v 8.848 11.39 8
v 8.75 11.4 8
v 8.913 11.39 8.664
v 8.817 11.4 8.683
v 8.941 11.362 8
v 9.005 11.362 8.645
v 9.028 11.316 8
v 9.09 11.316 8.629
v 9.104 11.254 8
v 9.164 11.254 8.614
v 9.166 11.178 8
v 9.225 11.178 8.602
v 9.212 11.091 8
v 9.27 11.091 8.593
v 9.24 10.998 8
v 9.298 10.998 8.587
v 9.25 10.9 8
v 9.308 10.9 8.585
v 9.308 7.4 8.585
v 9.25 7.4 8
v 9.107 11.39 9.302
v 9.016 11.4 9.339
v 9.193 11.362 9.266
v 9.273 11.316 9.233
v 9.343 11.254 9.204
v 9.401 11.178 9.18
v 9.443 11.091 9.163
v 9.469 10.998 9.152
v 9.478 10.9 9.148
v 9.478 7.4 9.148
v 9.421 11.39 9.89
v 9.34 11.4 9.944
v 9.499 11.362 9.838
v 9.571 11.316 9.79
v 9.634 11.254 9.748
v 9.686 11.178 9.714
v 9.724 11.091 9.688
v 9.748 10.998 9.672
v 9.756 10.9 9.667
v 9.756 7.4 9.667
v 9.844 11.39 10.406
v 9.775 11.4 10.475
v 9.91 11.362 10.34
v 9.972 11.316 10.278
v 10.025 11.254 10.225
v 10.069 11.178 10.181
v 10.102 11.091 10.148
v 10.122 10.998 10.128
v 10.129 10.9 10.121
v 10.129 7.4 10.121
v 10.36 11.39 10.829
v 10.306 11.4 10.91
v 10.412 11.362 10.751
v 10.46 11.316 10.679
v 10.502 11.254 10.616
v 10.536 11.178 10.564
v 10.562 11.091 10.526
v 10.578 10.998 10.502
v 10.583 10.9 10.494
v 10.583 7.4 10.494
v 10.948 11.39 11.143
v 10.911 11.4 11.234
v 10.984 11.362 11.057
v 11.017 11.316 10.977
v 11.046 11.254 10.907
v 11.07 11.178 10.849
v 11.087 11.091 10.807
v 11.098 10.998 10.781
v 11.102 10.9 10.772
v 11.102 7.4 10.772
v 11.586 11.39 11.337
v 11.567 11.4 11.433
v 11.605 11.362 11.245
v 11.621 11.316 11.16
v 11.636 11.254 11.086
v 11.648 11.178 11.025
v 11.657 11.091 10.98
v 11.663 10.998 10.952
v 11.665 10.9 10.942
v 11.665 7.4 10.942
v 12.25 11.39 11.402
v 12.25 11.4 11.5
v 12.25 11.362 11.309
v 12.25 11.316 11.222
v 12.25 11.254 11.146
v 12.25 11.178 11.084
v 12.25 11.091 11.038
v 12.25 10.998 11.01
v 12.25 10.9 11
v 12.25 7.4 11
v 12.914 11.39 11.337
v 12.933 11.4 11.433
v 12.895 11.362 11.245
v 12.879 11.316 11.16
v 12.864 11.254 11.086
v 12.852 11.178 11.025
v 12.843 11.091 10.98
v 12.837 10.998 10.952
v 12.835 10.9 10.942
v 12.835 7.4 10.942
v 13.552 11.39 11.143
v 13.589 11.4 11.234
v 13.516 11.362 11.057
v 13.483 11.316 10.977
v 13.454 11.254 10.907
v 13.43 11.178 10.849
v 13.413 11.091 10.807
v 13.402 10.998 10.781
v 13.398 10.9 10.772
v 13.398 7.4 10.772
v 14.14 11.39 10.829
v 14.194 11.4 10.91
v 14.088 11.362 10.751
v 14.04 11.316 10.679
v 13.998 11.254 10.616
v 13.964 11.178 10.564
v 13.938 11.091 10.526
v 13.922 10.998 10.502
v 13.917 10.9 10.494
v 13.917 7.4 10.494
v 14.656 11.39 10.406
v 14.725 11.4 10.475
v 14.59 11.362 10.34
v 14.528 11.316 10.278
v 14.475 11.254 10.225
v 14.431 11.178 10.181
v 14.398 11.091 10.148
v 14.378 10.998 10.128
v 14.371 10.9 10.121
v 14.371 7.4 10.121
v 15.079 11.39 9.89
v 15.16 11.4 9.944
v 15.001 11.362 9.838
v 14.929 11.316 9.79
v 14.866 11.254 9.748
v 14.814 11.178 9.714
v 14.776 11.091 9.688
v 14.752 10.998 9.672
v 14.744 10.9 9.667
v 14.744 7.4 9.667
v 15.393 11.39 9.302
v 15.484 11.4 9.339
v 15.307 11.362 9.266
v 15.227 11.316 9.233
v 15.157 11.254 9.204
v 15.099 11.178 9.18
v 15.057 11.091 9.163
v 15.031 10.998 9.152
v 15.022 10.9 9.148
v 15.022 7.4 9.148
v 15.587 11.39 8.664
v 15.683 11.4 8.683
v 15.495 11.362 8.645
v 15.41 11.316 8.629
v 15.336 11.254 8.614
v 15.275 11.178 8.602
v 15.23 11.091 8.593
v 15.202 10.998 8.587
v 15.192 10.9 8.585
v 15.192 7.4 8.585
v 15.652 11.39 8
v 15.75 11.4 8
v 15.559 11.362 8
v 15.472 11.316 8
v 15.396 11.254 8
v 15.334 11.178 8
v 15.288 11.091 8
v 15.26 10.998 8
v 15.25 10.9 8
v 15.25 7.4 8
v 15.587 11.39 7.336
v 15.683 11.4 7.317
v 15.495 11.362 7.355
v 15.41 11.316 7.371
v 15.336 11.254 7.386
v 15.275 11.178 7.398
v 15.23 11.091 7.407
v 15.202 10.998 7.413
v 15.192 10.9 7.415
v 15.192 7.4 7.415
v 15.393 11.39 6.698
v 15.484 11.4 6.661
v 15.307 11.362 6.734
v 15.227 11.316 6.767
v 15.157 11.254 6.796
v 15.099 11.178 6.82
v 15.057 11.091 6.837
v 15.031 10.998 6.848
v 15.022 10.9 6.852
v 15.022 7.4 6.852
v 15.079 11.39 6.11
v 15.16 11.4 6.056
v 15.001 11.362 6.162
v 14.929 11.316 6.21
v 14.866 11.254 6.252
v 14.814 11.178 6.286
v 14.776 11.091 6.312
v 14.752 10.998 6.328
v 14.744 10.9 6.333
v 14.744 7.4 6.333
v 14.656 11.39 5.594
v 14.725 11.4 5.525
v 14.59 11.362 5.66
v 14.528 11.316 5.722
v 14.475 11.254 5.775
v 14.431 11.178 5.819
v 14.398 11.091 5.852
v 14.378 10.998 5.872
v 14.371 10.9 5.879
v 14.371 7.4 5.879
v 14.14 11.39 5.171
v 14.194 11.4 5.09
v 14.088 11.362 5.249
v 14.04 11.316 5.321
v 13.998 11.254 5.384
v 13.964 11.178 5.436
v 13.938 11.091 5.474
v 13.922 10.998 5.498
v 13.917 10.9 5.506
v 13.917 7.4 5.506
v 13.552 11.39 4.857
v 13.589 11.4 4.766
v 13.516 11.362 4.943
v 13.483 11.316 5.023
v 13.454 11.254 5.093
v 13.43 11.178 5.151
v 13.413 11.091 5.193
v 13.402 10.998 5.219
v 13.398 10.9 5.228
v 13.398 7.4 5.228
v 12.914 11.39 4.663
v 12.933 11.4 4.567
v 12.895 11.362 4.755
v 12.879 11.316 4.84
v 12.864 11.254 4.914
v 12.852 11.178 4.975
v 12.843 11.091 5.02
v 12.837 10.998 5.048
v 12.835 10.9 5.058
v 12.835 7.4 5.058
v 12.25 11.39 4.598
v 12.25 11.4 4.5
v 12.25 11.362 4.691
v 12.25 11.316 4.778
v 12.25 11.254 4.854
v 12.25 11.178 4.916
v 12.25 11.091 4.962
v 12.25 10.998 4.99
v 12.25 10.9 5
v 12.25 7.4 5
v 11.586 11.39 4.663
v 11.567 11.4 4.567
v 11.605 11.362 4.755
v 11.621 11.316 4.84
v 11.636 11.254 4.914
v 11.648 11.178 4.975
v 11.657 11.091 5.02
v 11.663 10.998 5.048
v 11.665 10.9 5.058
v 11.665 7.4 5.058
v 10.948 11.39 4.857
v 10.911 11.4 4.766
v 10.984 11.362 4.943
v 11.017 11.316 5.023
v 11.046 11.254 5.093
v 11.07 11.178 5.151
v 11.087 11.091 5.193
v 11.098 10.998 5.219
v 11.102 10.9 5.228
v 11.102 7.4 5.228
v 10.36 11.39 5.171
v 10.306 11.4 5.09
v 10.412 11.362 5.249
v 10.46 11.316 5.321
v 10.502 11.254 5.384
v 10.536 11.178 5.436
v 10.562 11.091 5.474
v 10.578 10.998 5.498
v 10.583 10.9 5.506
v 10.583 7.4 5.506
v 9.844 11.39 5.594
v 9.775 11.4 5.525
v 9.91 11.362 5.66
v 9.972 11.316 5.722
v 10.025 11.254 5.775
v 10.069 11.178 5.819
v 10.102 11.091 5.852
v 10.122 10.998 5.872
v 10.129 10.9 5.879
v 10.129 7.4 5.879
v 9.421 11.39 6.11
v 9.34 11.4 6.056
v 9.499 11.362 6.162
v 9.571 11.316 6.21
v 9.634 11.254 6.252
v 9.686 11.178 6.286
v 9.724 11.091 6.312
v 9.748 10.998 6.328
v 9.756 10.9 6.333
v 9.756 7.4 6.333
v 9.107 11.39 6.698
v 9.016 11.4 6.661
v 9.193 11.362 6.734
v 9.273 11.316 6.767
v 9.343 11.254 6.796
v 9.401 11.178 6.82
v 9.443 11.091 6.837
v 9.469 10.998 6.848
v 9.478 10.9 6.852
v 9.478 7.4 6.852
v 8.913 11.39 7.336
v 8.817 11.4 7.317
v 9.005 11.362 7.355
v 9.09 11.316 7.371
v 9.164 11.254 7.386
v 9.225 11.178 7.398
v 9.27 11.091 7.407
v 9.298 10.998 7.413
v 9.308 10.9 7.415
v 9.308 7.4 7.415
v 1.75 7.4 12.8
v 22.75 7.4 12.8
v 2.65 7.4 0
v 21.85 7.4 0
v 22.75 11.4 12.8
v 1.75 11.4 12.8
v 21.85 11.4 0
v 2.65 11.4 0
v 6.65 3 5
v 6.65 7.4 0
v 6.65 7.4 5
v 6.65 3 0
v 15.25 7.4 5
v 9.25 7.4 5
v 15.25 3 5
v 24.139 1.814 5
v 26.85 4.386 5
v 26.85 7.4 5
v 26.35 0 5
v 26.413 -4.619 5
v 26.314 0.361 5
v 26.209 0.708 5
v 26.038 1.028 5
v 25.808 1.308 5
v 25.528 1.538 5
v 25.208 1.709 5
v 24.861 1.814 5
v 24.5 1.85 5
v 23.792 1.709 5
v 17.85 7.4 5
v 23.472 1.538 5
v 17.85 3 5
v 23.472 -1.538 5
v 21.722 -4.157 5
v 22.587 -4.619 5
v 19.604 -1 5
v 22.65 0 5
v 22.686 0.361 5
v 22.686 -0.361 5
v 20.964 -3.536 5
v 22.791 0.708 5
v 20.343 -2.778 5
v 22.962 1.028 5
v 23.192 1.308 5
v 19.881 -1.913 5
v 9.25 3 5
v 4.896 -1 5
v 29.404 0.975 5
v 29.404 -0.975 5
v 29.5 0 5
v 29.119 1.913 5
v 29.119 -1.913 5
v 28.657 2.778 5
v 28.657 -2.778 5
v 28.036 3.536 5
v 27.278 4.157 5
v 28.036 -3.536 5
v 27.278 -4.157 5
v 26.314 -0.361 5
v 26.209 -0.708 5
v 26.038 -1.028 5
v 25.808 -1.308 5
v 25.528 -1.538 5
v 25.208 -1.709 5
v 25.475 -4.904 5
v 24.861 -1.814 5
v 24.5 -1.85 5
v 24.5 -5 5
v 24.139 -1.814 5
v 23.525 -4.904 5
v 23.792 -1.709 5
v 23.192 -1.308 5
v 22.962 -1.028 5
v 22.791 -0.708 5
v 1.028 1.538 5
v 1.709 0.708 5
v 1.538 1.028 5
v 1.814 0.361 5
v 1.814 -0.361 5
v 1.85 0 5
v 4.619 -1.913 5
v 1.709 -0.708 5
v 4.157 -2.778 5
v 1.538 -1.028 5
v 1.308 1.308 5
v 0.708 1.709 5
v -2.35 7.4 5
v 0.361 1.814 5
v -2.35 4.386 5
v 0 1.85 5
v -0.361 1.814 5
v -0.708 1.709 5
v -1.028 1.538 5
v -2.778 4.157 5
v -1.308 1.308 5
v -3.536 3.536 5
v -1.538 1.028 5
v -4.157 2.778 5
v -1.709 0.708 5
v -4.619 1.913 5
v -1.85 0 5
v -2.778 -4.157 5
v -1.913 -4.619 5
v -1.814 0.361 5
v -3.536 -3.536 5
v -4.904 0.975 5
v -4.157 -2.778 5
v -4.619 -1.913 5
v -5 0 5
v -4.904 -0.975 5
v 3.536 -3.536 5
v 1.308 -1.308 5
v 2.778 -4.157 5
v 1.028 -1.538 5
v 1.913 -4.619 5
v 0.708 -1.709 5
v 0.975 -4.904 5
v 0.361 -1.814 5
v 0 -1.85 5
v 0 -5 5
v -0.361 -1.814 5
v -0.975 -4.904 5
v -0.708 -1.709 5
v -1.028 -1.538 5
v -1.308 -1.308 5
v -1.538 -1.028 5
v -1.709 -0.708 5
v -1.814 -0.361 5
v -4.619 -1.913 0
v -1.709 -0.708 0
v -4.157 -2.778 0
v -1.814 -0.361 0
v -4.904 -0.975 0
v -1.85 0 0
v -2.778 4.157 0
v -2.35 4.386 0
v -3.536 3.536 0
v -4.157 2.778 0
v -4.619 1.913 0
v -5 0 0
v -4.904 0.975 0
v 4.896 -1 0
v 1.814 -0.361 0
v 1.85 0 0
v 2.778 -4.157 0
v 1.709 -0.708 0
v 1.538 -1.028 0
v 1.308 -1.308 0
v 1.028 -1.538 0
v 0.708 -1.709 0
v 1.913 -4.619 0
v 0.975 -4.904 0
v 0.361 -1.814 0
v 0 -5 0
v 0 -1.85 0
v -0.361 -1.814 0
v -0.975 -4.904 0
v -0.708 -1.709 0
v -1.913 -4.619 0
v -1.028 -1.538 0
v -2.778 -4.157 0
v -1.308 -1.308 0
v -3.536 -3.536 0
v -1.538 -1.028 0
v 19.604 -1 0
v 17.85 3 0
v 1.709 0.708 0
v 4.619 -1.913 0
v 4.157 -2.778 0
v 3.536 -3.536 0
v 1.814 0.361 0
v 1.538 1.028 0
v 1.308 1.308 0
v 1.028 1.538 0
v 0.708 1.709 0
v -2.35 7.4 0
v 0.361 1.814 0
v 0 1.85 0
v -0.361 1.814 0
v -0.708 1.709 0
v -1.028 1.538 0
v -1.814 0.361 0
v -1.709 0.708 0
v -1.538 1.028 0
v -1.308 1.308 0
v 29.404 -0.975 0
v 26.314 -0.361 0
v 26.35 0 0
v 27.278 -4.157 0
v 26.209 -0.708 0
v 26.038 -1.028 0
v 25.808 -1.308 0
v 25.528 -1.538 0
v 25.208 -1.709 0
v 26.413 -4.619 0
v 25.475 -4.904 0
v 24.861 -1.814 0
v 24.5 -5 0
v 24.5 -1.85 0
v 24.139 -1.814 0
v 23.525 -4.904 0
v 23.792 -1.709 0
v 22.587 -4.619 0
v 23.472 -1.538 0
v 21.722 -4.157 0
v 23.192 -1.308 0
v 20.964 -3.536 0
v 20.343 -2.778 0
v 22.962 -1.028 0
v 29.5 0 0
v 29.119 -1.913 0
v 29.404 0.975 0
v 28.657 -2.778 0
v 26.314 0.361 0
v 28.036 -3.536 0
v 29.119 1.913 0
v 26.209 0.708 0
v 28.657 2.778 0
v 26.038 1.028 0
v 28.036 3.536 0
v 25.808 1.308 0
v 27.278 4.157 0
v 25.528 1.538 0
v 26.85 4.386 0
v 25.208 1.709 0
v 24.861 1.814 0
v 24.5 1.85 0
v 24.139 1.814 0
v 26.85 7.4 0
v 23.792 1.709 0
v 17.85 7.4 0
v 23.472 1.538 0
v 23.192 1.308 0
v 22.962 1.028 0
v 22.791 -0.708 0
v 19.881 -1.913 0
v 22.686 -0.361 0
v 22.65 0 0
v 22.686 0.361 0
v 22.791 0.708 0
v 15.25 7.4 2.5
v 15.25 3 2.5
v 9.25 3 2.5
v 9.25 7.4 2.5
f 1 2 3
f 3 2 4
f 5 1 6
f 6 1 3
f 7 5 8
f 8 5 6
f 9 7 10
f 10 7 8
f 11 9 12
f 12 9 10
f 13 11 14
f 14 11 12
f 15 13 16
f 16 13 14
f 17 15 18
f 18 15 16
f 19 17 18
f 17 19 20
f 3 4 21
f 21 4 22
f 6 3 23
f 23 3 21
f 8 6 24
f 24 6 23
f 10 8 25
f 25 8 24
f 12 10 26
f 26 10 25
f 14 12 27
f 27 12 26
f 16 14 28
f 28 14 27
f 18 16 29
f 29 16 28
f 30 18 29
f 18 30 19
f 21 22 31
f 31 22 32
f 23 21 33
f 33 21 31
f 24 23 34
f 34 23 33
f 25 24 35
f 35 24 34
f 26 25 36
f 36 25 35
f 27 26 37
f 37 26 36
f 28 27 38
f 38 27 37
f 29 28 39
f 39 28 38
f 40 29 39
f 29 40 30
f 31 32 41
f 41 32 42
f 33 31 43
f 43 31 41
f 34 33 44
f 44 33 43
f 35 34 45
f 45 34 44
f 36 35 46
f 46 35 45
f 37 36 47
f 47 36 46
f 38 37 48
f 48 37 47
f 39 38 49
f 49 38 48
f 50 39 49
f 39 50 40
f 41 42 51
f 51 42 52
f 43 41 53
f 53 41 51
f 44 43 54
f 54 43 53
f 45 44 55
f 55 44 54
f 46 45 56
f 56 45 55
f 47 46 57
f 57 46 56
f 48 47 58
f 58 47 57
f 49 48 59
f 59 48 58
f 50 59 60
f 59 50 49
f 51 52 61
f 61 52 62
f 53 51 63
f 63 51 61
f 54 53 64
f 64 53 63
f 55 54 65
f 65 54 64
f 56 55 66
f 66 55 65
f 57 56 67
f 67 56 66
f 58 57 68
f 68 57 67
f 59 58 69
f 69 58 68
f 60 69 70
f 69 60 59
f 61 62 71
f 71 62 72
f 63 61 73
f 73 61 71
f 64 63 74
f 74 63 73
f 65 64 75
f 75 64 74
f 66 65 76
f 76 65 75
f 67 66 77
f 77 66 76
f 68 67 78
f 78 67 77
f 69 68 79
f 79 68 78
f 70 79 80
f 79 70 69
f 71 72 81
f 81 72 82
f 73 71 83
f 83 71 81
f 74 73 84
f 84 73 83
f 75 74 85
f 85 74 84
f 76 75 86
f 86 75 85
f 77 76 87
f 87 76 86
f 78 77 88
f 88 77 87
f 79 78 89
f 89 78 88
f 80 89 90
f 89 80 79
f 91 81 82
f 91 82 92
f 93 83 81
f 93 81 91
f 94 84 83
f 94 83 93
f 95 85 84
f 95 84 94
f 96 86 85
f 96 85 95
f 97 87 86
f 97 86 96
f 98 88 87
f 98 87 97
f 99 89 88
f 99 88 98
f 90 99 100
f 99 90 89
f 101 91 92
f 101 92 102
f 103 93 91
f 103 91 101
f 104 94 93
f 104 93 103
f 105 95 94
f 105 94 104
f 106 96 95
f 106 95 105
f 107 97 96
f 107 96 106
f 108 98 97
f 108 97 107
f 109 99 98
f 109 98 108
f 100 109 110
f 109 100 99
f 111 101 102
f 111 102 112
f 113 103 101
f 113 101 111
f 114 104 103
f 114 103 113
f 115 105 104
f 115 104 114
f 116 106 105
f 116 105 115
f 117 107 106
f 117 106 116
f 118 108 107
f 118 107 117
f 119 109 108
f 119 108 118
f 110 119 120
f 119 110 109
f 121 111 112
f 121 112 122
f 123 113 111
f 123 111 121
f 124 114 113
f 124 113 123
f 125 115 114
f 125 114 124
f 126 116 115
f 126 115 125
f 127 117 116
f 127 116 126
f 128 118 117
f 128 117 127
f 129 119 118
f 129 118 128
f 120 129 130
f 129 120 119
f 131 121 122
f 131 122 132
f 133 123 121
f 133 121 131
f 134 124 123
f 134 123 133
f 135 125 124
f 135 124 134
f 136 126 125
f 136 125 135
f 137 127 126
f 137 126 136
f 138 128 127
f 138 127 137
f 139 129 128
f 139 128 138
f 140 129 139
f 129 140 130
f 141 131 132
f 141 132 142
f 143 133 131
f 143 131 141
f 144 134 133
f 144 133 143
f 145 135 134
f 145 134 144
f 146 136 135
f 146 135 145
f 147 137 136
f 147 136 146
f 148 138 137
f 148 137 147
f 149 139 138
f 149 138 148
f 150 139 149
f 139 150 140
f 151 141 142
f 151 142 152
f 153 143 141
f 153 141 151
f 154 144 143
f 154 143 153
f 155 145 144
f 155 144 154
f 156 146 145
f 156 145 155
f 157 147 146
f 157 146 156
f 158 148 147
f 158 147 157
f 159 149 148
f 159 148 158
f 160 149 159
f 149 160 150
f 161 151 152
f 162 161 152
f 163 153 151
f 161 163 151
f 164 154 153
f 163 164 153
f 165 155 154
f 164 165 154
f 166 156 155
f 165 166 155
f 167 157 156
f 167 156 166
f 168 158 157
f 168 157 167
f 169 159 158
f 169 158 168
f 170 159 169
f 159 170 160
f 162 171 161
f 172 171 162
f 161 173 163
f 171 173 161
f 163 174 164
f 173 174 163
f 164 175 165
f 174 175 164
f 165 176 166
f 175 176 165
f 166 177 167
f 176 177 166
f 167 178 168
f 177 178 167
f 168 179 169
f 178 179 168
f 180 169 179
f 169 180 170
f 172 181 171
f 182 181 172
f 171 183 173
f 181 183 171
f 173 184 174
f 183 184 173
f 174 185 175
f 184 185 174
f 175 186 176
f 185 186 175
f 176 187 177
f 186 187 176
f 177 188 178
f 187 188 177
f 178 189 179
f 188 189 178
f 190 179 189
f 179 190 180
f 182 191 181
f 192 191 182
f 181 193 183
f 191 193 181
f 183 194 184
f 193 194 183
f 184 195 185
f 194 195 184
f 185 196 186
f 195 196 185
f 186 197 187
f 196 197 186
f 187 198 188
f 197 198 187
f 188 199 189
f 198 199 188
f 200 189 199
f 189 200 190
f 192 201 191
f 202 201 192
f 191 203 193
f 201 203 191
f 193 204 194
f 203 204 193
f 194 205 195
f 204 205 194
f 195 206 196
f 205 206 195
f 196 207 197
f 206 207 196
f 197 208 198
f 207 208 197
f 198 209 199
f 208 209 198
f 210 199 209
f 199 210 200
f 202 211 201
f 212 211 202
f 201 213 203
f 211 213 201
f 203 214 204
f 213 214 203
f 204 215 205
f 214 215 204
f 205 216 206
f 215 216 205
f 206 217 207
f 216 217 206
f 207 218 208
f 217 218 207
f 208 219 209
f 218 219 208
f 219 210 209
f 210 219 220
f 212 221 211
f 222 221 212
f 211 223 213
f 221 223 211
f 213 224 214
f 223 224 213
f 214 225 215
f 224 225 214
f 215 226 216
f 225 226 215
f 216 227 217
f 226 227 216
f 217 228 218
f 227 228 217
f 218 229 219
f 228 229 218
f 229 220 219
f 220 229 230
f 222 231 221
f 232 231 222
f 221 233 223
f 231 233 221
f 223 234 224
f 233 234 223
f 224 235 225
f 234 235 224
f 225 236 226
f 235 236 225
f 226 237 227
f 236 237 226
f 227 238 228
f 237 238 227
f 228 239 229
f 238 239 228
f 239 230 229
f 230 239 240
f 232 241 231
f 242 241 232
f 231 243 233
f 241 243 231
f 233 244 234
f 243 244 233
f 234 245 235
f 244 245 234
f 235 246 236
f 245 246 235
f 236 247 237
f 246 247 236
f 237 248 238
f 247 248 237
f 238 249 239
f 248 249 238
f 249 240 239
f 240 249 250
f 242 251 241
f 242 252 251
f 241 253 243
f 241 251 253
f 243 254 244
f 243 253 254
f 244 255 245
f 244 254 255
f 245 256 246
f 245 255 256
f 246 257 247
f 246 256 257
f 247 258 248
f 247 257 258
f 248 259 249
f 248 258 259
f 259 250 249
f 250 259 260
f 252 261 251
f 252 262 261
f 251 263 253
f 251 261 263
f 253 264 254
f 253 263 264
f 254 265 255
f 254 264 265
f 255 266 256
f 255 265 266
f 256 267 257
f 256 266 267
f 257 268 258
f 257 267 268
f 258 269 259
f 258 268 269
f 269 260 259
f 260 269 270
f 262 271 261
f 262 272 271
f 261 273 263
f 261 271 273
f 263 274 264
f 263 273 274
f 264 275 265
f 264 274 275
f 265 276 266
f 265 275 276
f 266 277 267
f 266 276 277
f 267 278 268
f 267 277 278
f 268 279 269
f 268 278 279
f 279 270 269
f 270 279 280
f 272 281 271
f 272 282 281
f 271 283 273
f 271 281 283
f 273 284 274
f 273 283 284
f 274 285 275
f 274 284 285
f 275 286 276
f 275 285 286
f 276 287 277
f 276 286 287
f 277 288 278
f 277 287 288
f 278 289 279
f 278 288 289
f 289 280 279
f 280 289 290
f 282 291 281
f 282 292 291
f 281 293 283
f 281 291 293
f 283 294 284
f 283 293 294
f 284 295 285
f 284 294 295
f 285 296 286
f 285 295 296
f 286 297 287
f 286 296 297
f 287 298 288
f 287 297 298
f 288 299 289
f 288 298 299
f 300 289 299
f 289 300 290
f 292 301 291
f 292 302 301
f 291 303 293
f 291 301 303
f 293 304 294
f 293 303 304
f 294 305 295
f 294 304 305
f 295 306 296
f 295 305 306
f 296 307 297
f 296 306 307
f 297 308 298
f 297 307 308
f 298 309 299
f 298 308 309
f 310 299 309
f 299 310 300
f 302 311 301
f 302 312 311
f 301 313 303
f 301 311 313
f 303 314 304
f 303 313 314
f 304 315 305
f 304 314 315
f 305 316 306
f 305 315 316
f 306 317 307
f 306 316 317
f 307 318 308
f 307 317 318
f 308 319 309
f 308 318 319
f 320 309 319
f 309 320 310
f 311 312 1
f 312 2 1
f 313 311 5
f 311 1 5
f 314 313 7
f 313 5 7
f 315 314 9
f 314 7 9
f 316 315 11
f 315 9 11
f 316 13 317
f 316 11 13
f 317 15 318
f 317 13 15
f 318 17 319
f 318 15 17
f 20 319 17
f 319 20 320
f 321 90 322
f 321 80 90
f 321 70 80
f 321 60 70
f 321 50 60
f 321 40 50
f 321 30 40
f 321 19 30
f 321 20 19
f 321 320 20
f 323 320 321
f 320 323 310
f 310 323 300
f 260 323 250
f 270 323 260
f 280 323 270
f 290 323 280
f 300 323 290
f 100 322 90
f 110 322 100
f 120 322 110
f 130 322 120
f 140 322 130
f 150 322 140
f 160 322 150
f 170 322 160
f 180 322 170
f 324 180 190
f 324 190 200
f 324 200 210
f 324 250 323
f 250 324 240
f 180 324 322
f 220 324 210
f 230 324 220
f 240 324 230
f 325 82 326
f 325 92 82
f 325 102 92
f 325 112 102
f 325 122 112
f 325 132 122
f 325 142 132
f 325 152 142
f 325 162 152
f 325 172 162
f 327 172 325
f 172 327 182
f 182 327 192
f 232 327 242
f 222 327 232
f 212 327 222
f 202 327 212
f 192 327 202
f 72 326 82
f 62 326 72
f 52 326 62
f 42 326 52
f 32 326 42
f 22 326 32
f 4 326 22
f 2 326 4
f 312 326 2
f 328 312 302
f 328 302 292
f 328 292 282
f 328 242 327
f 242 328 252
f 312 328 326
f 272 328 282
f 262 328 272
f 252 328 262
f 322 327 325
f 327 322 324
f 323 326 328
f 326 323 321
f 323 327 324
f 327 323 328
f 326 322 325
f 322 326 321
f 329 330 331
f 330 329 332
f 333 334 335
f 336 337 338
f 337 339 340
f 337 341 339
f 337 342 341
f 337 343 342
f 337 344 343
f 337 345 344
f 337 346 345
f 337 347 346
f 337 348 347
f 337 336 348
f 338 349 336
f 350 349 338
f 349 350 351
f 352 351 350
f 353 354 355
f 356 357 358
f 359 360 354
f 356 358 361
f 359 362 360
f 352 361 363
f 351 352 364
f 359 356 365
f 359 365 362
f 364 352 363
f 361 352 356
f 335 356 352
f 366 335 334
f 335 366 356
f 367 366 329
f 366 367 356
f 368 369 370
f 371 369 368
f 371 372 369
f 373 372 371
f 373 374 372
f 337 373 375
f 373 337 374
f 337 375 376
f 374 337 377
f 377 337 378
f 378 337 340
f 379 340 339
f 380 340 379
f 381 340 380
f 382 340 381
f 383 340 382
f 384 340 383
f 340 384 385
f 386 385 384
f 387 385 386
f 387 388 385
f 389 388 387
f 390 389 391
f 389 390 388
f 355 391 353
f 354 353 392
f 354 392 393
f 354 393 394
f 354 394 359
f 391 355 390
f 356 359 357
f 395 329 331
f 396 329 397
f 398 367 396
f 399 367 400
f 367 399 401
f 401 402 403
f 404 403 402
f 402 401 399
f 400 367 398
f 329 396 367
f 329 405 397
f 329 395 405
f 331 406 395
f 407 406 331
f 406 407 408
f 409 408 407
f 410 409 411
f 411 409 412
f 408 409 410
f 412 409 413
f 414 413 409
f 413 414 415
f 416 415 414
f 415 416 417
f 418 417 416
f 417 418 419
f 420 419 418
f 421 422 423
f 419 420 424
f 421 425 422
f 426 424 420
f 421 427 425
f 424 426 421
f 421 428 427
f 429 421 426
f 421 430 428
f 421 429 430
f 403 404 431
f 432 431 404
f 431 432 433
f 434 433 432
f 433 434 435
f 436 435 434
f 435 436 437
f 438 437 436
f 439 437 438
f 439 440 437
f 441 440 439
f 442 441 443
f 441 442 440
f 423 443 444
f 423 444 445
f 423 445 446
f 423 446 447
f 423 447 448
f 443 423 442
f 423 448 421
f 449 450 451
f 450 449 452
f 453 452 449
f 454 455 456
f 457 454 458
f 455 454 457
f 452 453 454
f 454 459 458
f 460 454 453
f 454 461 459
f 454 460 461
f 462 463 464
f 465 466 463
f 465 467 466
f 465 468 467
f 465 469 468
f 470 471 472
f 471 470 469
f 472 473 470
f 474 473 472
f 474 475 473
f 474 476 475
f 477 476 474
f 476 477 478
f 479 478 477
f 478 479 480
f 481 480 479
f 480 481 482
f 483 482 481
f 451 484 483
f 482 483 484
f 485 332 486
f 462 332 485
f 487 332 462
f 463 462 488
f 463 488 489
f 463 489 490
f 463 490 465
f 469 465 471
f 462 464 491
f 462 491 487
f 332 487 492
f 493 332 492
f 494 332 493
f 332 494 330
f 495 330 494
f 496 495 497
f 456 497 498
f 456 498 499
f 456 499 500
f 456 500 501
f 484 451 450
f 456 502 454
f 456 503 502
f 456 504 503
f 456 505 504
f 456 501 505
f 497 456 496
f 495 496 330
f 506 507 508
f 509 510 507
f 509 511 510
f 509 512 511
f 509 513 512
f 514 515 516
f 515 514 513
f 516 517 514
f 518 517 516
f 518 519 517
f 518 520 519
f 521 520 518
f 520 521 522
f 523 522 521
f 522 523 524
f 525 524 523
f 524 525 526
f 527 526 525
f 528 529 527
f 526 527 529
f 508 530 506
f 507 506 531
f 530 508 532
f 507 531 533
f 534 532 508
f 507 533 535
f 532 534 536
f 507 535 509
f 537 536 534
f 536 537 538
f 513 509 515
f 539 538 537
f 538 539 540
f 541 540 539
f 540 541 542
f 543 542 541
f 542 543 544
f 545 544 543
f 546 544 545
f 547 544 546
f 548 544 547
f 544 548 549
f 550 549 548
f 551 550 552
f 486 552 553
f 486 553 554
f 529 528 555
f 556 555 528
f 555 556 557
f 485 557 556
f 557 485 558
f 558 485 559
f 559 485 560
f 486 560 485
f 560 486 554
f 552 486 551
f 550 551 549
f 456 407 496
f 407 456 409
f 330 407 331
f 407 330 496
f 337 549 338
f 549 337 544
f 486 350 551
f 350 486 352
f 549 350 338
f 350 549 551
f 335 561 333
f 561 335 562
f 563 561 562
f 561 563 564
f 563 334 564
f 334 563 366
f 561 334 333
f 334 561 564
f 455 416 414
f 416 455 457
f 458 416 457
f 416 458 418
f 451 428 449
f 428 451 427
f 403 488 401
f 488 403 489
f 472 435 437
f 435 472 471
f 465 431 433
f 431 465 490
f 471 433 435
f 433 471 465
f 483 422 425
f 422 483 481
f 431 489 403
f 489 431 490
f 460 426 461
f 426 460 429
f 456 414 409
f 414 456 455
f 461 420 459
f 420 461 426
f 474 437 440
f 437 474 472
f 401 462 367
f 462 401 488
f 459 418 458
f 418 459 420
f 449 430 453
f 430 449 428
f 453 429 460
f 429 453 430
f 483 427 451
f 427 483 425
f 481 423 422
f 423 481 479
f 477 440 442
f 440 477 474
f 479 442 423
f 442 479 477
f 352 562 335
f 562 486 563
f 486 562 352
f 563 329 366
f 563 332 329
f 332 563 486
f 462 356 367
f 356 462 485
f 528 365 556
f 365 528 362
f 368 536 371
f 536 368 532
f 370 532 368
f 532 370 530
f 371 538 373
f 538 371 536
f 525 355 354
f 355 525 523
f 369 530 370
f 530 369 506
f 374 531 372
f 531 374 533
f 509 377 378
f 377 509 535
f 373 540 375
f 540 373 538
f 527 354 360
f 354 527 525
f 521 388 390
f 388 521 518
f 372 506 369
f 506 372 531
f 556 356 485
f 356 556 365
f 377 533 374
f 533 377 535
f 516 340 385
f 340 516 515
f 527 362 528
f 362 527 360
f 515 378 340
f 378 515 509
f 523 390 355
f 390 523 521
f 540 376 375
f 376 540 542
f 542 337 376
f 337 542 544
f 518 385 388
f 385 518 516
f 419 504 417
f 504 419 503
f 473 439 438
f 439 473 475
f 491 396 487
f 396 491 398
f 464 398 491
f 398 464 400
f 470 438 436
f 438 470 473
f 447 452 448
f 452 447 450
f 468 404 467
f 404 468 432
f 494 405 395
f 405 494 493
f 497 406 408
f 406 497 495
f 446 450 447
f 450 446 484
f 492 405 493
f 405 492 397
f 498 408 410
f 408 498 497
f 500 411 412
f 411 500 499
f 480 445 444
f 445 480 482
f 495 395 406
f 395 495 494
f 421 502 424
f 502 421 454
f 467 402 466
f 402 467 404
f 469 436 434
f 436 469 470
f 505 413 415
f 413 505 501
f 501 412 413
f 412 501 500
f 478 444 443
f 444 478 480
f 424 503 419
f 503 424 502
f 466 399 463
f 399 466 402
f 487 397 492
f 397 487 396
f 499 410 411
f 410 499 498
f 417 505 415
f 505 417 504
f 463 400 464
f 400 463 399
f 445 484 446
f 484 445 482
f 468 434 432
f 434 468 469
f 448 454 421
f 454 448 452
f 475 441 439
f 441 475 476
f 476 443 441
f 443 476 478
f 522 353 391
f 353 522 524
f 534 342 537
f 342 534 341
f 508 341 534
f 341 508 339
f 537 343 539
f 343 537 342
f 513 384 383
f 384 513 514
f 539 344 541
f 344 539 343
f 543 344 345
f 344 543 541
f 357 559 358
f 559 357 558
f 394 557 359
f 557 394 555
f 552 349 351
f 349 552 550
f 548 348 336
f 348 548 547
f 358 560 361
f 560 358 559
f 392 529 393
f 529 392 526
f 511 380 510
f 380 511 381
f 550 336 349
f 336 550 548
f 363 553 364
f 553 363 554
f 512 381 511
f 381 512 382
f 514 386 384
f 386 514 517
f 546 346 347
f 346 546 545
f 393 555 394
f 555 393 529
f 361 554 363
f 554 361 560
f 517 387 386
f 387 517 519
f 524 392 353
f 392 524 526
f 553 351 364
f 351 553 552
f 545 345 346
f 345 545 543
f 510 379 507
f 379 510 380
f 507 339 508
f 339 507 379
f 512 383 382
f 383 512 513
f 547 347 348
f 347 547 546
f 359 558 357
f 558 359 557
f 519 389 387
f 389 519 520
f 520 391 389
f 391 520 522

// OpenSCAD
// Copyright 2019 Marcos Del Sol Vives
// SPDX-License-Identifier: ISC

$fn=32;

// Height of the base piece that clips on the pins
base_height = 5;

// Space between pins
pin_spacing = 24.5;

// Diameter of plastic pins
pin_diameter = 3.7;

// Thickness of bridge connecting both pins
pin_bridge_thickness = 4;

// Diameter of holders that go around the pins
pin_holder_diameter = 10;

wall_thickness = 4;
wall_width_lower = 19.2;
wall_width_upper = 21; // was 21.2
wall_height = 12.8; // was 14

// Distance from pin center to the wall where the hole is
pin_wall_distance = 7.4; // was 7.3

// Wall-bridge connection offset
wall_bridge_offset = 5;

// Wall-bridge connection thickness
wall_bridge_thickness = 9;

// Cable size
cable_width = 6;
cable_height = 6;

// Zip tie thickness, needed to leave space between holder and PCB
zip_thickness = 2.5;

// Cable hole radius
cable_hole_radius = 0.5;

module hole_bevel_profile() {
	let (
			bb_width = cable_height / 2 + cable_hole_radius
	) {

		difference() {
			square([bb_width, cable_hole_radius]);
			translate([bb_width, cable_hole_radius])
				circle(r = cable_hole_radius);
		}
		translate([0, cable_hole_radius]) {
			square([cable_height / 2, wall_thickness - cable_hole_radius]);
		}
	}
}

difference() {
	union() {
		// Build holder for left pin
		cylinder(d=pin_holder_diameter, h=base_height);

		// Build the bridge between pin holders
		translate([0, -1, 0])
			cube([pin_spacing, pin_bridge_thickness, base_height]);

		// Build holder for right pin
		translate([pin_spacing, 0, 0])
			cylinder(d=pin_holder_diameter, h=base_height);

		// Center all this crap
		translate([pin_spacing / 2 - wall_width_lower / 2, 0, 0]) {
			// Build the wall
			// TODO: remember to bill Mexico later
			translate([0, wall_thickness + pin_wall_distance, 0]) {
				rotate([90, 0, 0]) {
					difference() {
						linear_extrude(wall_thickness) {
							polygon([
								[0, 0],
								[wall_width_lower, 0],
								[wall_width_lower / 2 + wall_width_upper / 2, wall_height],
								[wall_width_lower / 2 - wall_width_upper / 2, wall_height]
							]);
						};

						// Hole for the cable
						translate([wall_width_lower / 2 - (cable_width - cable_height) / 2, base_height + cable_height / 2, 0]) {
							rotate_extrude() {
								hole_bevel_profile();
							}
							rotate([90, 0, 90]) {
								linear_extrude(cable_width - cable_height) {
									hole_bevel_profile();
								}
							}
							mirror([0, 1, 0]) {
								rotate([90, 0, 90]) {
									linear_extrude(cable_width - cable_height) {
										hole_bevel_profile();
									}
								}
							}
							translate([cable_width - cable_height, 0, 0]) {
								rotate_extrude() {
									hole_bevel_profile();
								}
							}
						}
					}
				}
			}

			// Left connection of wall with bridge
			translate([-wall_bridge_offset, 0, 0]) {
				cube([wall_bridge_thickness, pin_wall_distance, base_height]);
			}

			// Right connection of wall with bridge
			translate([wall_width_lower - wall_bridge_thickness + wall_bridge_offset, 0, 0])
				cube([wall_bridge_thickness, pin_wall_distance, base_height]);

			// Center connection where the zip tie should be put
			translate([wall_width_lower / 2 - cable_width / 2, 0, zip_thickness])
				cube([cable_width, pin_wall_distance, base_height - zip_thickness]);
		}

	}

	// Hole for left pin
	cylinder(d=pin_diameter, h=base_height);

	// Hole for right pin
	translate([pin_spacing, 0, 0])
		cylinder(d=pin_diameter, h=base_height);
}
